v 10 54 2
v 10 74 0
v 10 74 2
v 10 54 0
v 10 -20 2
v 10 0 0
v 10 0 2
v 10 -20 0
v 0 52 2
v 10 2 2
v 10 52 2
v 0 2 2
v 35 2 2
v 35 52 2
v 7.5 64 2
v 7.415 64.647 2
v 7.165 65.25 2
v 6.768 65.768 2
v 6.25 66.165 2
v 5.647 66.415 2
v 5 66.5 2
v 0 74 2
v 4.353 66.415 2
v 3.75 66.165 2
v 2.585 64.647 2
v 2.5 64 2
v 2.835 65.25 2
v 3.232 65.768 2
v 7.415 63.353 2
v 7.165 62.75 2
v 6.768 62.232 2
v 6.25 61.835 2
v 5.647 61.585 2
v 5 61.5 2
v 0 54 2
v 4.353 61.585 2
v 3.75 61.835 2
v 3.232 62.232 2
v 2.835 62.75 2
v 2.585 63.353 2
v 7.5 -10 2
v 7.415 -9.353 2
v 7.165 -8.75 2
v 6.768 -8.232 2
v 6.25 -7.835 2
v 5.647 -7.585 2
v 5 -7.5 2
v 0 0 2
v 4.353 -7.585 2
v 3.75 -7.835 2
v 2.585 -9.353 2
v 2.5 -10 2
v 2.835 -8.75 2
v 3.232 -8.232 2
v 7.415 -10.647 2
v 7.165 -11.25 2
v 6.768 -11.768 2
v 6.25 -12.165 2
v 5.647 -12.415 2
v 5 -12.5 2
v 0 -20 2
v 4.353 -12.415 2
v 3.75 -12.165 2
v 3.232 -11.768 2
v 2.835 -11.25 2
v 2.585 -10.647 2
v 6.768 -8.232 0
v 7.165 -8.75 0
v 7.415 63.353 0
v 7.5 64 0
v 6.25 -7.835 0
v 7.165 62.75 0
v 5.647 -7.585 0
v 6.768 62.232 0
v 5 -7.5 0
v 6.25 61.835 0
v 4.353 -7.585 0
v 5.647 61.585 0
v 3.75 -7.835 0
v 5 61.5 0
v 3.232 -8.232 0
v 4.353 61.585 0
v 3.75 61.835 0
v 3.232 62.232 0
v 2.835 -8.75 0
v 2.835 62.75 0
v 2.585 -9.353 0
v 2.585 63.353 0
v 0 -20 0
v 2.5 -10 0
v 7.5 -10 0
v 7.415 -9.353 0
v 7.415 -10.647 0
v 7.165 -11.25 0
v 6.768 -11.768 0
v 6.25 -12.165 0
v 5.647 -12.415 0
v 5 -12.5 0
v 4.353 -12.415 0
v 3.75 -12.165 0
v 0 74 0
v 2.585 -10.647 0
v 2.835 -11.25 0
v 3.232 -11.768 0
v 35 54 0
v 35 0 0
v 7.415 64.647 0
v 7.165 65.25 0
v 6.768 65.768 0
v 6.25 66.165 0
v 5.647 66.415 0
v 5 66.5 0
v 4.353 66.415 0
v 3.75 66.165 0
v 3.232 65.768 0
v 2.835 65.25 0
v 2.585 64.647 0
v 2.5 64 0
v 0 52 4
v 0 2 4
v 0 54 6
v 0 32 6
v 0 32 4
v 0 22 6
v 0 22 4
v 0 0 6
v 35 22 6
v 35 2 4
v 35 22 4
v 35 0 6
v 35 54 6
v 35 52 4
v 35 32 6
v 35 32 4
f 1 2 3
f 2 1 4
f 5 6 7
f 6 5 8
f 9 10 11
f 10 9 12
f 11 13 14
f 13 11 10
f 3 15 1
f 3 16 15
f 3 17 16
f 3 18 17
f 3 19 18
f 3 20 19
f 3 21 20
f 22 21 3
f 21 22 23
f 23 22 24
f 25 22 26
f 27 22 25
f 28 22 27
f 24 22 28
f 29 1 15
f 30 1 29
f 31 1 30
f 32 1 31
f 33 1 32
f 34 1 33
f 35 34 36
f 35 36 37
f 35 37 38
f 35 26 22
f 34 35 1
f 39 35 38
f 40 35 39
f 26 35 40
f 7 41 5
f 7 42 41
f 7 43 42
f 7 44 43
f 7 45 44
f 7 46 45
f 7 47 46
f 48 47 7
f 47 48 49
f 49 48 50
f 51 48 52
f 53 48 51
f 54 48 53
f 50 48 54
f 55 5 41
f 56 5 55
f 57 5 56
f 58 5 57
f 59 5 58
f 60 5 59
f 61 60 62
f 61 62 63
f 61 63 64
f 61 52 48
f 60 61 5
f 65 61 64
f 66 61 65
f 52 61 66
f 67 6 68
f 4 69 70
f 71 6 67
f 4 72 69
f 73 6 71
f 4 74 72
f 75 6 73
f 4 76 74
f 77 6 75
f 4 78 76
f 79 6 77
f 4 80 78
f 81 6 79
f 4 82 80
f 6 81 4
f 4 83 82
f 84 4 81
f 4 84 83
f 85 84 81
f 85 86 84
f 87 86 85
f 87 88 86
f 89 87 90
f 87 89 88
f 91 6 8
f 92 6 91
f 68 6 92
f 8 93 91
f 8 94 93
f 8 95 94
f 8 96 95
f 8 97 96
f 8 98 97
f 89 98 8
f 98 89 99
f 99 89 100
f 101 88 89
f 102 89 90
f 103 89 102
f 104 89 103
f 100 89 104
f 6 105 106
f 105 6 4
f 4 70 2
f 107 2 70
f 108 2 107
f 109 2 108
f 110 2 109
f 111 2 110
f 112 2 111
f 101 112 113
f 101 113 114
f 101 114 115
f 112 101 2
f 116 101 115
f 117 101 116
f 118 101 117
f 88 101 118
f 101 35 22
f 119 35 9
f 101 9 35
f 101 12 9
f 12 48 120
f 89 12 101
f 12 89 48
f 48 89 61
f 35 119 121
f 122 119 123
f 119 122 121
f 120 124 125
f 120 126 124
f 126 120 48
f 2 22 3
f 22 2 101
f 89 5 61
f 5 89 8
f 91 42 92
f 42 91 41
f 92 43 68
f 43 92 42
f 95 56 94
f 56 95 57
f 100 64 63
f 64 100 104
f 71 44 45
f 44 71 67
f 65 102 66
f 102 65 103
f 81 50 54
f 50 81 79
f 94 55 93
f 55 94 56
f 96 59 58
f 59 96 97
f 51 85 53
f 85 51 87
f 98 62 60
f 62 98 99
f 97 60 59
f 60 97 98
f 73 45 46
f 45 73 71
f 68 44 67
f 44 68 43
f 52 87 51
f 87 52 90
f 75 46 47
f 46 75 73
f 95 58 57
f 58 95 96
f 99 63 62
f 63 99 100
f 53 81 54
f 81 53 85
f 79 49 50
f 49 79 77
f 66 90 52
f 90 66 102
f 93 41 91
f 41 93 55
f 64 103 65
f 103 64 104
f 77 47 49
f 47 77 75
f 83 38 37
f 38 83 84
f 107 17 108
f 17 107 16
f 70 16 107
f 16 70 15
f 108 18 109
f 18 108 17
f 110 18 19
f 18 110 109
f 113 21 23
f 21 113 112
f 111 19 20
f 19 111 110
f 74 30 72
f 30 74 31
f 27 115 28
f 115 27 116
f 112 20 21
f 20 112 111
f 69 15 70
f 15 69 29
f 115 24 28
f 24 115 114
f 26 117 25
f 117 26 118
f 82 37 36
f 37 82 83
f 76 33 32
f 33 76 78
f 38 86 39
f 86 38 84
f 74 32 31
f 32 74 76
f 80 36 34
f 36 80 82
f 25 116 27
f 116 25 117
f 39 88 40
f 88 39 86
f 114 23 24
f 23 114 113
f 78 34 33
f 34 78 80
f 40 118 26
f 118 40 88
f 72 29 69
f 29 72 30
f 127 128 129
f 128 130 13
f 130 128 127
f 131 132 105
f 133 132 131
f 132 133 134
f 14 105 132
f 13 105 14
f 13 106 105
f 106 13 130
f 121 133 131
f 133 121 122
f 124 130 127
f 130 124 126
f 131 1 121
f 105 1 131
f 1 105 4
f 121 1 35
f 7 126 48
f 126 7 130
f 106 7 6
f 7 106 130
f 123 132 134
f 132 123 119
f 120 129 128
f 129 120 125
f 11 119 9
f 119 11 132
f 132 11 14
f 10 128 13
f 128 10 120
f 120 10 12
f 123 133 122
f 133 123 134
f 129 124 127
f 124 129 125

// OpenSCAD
wall_thickness = 2;
belt_width = 50;
center_gap = 10;
width = 35;
epsilon = 0.01;
flange_length = 20;
flange_width = 10;
screw_hole_diameter = 5;

union() {
  difference () {
    // Mounting flange
    translate ([0, -flange_length, 0]) {
      cube ([flange_width, belt_width + 2 * wall_thickness + 2 * flange_length, wall_thickness]);
    }
    // Screw hole #1
    translate([flange_width/2, -flange_length/2, -epsilon]) {
      cylinder($fn=24, h=wall_thickness+2*epsilon, d=screw_hole_diameter);
    }
    // Screw hole #2
    translate([flange_width/2, flange_length/2 + belt_width + 2 * wall_thickness, -epsilon]) {
      cylinder($fn=24, h=wall_thickness + 2 * epsilon, d=screw_hole_diameter);
    }

  }
  difference() {
    cube([width, belt_width + 2 * wall_thickness, wall_thickness * 3]);
    translate([-epsilon, wall_thickness, wall_thickness]) {
      cube([width + 2*epsilon, belt_width, wall_thickness]);
    }
    // Gap
    translate([-epsilon, belt_width/2+wall_thickness - center_gap / 2, wall_thickness*2 - epsilon]) {
      cube([width+2*epsilon, center_gap, wall_thickness + 2*epsilon]);
    }
  }
}
